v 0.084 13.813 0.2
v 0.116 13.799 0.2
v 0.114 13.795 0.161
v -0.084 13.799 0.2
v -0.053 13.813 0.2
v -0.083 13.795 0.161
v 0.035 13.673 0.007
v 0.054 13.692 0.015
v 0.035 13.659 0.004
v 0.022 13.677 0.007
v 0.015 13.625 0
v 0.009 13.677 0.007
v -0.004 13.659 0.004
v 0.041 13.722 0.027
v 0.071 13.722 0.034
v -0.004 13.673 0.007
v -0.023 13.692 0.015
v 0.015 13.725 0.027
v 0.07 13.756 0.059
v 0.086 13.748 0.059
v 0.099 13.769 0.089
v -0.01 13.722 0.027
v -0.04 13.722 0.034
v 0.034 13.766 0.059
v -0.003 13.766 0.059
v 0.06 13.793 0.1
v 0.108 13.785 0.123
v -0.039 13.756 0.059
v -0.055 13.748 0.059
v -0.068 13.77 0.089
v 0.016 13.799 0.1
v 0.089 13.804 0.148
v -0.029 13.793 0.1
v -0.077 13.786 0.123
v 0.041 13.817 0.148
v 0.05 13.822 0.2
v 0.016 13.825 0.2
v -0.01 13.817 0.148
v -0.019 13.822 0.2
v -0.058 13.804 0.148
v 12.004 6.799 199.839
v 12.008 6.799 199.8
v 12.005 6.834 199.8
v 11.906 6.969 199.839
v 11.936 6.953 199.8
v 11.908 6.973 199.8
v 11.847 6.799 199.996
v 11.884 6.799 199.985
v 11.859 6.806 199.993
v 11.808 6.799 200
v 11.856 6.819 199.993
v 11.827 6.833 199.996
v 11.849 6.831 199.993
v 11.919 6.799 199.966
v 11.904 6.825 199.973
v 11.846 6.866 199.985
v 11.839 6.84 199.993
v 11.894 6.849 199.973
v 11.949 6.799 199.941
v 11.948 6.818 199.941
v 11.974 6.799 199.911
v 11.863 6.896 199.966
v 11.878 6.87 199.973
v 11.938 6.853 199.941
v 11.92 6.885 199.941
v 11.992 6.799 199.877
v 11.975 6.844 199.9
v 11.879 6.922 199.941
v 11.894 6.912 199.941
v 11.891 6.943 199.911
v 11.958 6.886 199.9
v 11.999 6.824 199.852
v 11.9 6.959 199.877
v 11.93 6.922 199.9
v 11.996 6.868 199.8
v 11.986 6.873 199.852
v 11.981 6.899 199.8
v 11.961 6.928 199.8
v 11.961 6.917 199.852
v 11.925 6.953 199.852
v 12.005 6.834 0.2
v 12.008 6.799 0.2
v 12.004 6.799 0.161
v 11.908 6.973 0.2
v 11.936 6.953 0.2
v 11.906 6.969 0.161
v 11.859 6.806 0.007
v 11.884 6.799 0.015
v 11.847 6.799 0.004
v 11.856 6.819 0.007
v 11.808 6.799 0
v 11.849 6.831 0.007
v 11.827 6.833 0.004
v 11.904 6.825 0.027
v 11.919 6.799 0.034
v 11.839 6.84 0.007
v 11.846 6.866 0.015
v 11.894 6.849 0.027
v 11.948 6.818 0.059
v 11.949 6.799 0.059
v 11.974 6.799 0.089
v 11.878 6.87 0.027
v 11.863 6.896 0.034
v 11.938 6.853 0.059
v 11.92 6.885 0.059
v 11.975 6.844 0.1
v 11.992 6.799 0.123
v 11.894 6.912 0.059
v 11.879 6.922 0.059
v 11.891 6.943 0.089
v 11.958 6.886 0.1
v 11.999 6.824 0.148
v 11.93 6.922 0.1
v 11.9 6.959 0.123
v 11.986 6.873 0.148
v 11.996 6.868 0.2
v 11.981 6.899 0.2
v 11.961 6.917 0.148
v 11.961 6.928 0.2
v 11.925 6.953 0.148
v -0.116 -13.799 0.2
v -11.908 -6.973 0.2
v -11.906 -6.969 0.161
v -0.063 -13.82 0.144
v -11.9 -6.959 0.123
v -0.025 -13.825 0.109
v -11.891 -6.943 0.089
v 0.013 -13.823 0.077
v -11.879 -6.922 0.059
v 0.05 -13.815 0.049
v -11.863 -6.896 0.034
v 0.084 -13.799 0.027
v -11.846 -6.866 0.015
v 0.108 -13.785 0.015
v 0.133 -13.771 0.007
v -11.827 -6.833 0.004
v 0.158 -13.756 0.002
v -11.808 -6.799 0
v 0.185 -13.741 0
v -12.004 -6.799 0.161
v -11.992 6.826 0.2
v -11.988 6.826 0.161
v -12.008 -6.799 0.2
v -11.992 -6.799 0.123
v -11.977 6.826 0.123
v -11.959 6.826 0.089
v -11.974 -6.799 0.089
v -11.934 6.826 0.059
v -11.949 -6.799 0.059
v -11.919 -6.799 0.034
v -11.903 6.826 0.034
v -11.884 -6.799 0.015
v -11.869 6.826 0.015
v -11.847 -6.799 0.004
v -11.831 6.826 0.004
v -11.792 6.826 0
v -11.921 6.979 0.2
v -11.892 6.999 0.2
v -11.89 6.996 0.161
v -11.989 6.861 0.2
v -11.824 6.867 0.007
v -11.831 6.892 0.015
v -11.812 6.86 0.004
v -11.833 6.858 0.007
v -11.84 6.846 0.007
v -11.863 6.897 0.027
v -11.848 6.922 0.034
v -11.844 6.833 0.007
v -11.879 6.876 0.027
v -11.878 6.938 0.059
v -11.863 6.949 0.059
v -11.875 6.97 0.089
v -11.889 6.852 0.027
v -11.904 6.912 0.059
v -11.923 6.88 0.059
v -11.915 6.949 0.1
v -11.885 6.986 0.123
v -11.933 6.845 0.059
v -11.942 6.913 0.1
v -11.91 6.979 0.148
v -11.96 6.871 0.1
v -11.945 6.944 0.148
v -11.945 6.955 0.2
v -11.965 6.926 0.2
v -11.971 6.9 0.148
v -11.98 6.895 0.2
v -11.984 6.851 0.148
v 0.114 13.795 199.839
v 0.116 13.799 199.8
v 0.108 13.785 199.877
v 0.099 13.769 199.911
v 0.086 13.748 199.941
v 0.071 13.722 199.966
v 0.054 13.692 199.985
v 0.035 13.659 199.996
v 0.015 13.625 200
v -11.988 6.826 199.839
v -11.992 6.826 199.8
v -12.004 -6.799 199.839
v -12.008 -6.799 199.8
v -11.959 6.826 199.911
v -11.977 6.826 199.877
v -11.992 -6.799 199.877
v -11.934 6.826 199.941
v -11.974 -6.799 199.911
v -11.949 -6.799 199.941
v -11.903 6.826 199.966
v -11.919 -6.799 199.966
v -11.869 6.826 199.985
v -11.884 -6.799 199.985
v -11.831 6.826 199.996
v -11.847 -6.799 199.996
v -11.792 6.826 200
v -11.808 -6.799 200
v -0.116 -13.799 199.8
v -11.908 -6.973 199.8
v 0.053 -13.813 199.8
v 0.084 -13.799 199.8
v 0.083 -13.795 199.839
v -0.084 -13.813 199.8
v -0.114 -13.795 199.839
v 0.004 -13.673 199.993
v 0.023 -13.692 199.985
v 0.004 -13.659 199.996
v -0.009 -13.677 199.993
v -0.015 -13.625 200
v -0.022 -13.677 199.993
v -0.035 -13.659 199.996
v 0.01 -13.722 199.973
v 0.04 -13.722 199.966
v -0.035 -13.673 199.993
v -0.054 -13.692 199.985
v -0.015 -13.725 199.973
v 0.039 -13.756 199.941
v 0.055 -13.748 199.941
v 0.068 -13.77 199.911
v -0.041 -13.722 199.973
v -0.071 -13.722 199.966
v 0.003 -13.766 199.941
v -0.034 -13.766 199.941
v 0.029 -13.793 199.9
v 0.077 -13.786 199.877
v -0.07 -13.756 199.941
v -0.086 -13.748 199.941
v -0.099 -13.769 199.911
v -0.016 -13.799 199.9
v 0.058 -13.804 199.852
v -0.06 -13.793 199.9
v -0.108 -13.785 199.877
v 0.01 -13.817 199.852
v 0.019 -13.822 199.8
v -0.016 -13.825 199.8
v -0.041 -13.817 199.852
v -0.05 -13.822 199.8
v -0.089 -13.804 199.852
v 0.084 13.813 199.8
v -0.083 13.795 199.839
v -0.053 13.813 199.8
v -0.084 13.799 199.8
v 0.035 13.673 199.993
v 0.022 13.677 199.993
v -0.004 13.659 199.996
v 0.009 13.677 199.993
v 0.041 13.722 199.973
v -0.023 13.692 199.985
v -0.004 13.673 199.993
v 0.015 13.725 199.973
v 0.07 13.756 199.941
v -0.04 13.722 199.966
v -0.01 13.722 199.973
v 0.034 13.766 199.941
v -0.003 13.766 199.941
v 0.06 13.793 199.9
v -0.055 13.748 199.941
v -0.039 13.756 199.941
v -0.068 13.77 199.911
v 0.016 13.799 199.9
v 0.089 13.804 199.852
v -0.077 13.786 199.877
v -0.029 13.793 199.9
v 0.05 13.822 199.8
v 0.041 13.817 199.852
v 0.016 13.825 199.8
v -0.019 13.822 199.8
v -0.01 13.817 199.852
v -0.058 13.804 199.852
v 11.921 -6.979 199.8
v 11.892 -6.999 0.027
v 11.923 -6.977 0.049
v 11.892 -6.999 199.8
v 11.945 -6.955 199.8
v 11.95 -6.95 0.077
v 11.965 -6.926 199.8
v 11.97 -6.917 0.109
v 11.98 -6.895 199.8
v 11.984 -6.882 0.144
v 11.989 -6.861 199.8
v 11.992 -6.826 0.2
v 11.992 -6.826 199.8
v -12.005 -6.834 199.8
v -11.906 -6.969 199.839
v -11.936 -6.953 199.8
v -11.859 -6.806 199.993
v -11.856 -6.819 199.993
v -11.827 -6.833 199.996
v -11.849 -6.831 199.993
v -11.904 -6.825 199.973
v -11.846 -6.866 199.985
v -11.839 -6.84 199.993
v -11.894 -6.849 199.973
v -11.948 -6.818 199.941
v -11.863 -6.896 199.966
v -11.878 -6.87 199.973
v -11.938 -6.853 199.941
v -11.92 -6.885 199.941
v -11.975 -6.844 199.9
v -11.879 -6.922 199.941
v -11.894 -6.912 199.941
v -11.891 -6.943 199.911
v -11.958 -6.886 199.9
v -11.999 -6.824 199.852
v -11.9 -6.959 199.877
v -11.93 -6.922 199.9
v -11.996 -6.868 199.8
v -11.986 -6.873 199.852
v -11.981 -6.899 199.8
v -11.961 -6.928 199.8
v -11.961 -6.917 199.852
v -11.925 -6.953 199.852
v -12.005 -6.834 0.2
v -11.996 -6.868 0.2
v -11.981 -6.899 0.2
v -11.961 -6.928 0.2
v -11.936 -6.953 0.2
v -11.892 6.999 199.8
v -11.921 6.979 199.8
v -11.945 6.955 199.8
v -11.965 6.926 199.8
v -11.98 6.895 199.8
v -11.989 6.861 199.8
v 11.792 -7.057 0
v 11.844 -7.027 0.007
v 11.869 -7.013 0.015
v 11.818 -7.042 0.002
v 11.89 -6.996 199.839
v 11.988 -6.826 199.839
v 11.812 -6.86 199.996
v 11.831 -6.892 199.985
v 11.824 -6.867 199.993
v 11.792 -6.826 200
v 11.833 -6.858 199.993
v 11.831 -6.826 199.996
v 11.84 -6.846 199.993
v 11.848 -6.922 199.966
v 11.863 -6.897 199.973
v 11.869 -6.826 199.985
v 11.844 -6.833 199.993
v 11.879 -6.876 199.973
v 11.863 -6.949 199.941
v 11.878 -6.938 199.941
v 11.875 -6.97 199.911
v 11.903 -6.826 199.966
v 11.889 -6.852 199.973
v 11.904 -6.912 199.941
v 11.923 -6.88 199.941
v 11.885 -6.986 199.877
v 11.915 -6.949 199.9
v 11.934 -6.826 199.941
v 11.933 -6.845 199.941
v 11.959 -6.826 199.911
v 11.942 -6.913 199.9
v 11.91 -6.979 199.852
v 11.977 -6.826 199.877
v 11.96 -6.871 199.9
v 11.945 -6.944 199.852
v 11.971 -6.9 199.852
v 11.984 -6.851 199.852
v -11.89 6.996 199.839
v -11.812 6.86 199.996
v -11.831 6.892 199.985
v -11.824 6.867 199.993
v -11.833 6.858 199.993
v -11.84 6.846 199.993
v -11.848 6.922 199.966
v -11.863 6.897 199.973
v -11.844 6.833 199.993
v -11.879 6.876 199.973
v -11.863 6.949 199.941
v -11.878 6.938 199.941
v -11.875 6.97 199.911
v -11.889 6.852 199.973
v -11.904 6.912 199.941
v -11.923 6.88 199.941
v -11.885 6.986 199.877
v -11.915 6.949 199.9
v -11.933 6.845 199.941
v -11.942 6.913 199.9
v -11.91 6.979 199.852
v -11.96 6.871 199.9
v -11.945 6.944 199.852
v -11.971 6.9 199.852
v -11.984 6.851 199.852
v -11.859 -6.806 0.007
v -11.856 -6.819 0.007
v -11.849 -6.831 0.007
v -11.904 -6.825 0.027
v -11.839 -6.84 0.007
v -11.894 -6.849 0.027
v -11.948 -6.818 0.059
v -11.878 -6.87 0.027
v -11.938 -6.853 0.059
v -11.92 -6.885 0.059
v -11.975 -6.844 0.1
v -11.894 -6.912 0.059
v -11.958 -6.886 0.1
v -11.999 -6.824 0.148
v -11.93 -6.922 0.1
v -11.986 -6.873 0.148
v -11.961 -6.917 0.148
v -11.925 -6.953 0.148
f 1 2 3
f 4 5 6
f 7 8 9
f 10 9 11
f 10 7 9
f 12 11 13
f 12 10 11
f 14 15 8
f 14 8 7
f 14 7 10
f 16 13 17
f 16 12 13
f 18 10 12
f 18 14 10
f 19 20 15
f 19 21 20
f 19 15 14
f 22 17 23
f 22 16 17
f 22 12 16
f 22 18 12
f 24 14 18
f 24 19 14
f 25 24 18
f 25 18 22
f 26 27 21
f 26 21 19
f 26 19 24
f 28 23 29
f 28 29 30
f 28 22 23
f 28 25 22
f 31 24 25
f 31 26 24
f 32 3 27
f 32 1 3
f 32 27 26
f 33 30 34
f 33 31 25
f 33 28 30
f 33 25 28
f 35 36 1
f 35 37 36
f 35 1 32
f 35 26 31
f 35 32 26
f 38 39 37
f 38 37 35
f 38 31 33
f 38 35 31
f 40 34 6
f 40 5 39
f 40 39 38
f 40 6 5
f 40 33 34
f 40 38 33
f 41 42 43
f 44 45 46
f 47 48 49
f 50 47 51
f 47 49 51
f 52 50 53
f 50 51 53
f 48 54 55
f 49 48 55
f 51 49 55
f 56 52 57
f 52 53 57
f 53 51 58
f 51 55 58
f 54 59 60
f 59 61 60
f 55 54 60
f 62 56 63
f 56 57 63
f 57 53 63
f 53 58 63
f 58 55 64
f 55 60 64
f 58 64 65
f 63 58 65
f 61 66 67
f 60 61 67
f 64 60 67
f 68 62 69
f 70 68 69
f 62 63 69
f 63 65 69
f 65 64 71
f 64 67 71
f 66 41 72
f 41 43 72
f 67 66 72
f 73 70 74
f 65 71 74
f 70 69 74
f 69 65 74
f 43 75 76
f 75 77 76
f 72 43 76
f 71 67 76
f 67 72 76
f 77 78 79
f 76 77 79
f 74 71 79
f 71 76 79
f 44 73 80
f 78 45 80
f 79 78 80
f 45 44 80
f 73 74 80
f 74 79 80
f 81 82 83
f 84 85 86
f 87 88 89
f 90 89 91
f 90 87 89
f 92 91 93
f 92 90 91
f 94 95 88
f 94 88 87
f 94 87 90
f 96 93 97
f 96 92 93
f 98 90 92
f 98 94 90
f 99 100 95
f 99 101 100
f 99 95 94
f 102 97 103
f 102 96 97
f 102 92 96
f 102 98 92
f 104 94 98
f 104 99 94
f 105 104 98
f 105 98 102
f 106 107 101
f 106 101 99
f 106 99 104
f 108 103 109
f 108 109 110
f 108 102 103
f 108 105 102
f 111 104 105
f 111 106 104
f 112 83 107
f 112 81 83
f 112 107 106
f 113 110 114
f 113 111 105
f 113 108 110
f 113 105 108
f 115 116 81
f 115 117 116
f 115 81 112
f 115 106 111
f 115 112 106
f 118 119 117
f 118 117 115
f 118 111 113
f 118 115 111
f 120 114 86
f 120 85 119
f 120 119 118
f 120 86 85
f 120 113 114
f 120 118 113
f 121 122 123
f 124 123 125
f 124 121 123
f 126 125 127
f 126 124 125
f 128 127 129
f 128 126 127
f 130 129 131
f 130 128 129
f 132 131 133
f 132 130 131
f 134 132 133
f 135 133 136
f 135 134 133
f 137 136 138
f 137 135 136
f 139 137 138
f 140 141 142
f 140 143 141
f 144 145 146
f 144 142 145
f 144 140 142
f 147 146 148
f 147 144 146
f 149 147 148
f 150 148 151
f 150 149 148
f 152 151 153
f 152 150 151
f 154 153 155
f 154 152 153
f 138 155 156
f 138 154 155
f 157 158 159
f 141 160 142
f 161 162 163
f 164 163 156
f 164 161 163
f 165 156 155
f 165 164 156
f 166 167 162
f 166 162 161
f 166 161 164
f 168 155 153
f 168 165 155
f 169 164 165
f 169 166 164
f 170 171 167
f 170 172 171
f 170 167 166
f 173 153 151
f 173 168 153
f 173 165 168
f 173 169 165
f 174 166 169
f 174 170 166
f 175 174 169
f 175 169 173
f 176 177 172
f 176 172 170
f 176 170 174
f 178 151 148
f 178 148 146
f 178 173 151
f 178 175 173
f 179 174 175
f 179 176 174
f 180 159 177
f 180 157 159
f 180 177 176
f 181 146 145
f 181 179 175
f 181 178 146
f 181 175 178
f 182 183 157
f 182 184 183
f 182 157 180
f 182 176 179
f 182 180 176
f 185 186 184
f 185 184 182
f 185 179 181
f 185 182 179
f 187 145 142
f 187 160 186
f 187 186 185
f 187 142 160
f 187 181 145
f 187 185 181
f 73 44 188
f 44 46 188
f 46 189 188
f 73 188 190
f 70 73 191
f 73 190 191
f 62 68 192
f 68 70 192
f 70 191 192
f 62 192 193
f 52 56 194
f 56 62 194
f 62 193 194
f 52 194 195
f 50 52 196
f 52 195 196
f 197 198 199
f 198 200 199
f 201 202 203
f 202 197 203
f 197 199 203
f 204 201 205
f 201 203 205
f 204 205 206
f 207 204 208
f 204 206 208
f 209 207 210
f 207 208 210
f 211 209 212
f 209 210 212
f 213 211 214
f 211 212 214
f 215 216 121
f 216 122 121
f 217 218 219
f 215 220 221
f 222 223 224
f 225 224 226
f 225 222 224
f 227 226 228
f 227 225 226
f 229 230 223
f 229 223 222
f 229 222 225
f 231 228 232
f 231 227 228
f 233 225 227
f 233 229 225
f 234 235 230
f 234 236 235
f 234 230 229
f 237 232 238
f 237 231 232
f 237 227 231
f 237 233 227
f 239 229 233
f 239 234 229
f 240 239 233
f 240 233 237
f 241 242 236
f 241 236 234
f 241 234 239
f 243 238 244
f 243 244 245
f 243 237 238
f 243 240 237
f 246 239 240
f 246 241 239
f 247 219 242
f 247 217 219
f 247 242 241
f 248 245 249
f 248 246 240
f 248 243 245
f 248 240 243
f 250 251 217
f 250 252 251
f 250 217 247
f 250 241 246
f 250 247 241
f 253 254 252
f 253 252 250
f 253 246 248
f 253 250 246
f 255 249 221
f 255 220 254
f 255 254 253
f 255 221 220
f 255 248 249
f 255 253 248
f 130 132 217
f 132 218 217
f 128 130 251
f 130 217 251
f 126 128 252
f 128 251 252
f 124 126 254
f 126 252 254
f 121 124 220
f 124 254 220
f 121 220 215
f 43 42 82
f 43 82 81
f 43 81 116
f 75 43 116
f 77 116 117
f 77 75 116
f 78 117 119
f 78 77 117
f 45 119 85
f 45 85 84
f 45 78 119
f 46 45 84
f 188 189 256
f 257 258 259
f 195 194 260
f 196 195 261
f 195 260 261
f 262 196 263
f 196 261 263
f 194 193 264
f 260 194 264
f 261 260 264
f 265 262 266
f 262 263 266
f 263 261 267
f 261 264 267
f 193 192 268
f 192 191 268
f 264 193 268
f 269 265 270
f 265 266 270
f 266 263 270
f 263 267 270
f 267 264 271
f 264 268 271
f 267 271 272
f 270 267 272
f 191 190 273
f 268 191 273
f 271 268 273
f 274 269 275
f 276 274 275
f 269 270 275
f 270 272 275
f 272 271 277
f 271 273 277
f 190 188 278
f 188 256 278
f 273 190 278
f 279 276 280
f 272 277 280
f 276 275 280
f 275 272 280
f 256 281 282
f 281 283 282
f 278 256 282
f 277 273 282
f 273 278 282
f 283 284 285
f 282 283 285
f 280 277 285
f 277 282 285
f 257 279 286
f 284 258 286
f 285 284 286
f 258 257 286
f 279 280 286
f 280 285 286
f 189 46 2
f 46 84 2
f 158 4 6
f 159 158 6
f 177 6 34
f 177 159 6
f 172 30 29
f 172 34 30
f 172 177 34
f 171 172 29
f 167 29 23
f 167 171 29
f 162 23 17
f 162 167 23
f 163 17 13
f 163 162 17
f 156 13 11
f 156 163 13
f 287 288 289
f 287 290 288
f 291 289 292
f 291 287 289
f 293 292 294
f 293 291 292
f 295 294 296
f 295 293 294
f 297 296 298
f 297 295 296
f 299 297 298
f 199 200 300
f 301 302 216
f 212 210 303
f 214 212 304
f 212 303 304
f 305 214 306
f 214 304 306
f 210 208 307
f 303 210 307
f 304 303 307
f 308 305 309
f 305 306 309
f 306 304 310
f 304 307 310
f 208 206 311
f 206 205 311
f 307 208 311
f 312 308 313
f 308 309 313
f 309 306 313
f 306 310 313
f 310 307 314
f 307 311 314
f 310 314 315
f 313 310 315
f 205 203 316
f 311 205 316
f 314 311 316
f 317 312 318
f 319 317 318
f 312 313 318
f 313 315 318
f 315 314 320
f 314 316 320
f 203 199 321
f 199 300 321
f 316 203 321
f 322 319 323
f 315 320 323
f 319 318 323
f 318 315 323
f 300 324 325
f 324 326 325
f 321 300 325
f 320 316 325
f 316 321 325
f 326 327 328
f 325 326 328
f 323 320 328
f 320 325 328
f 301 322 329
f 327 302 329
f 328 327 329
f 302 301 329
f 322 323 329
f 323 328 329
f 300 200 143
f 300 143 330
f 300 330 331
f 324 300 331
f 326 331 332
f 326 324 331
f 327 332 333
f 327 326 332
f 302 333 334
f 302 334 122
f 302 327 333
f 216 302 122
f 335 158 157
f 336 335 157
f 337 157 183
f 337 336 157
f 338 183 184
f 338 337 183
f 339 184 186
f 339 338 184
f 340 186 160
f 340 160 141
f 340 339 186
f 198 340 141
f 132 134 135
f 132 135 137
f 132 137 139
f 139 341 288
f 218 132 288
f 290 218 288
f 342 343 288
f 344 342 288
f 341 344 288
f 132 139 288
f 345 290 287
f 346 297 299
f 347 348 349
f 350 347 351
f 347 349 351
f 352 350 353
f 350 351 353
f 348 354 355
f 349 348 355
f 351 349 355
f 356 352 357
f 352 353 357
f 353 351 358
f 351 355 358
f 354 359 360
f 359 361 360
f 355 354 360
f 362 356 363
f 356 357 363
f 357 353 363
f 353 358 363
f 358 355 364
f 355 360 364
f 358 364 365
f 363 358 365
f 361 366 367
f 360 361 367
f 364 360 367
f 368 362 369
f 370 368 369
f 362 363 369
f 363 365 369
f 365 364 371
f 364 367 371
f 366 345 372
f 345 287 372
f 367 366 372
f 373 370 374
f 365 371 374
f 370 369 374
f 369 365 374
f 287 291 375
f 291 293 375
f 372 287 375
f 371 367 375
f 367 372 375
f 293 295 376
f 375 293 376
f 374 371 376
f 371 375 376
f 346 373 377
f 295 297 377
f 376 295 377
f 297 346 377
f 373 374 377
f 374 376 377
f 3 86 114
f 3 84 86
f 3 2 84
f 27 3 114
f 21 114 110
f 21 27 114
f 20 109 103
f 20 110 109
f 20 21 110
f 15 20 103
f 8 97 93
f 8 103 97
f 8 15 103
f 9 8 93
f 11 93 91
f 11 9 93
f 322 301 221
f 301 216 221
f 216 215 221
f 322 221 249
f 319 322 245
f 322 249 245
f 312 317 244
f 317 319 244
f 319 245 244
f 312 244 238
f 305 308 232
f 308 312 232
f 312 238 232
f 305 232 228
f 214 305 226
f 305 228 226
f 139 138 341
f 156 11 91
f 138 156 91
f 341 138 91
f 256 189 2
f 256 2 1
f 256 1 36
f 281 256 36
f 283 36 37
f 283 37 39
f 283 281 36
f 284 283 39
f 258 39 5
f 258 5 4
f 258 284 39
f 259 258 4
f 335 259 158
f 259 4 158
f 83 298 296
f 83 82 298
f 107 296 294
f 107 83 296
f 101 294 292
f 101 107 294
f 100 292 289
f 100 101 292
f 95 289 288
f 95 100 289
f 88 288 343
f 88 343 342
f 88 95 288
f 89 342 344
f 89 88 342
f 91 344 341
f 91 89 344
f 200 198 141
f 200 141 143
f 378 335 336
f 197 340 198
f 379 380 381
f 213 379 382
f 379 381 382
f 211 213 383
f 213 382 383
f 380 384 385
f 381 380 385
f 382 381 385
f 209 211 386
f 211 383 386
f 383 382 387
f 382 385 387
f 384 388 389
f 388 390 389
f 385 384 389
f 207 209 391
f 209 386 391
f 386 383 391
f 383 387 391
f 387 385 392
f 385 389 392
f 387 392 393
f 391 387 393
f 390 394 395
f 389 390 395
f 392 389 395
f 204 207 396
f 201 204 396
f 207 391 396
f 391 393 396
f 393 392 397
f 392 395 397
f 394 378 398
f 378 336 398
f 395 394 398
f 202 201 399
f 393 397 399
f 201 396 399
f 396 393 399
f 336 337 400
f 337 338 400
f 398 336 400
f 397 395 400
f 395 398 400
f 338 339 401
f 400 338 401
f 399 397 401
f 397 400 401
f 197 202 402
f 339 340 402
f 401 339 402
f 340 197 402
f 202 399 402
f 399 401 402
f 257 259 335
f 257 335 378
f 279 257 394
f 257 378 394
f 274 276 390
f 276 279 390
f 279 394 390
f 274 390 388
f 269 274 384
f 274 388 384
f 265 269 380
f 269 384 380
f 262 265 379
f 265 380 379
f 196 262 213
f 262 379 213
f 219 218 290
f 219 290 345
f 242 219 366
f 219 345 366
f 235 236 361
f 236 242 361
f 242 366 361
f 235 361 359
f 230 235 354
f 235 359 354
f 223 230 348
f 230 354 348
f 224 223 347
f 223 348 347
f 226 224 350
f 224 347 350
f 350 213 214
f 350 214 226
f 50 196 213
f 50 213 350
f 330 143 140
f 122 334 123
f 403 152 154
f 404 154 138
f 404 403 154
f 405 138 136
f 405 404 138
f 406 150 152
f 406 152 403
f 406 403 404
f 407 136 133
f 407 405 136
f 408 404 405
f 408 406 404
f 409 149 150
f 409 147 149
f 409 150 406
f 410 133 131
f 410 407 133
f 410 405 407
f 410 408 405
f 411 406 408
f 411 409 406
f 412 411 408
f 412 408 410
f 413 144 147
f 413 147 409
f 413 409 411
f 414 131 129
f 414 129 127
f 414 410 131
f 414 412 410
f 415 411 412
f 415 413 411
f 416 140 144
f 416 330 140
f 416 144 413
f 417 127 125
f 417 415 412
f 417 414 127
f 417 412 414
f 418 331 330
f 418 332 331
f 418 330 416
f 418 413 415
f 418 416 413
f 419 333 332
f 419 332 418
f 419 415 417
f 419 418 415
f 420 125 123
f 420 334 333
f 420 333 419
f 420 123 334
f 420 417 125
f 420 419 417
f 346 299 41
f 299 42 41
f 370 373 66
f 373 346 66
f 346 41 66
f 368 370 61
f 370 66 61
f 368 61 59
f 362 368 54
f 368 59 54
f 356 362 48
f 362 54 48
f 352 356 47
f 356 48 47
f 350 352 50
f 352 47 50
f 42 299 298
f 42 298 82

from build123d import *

# Parameters (mm, degrees)
F1_DEPTH = 200
F2_R     = 0.2


with BuildPart() as f1:
    # F0 (on Top) → F1 (new body)
    with BuildSketch(Plane.XY):
        Polygon((-0.015583, -13.856398), (11.992201, -6.941694), (12.007784, 6.914704), (0.015583, 13.856398), (-11.992201, 6.941694), (-12.007784, -6.914704), align=None)
    extrude(amount=F1_DEPTH)

    # F2
    f2_edges = [f1.edges().sort_by_distance(p)[0] for p in [
        (5.988309, -10.399046, 200),
        (11.999992, -0.013495, 200),
        (6.011683, 10.385551, 200),
        (-5.988309, 10.399046, 200),
        (-11.999992, 0.013495, 200),
        (-6.011683, -10.385551, 200),
        (11.992201, -6.941694, 100),
        (12.007784, 6.914704, 100),
        (11.999992, -0.013495, 0),
        (0.015583, 13.856398, 100),
        (6.011683, 10.385551, 0),
        (-11.992201, 6.941694, 100),
        (-5.988309, 10.399046, 0),
        (-12.007784, -6.914704, 100),
        (-11.999992, 0.013495, 0),
        (-0.015583, -13.856398, 100),
        (-6.011683, -10.385551, 0),
    ]]
    fillet(f2_edges, radius=F2_R)


solid = f1.part
